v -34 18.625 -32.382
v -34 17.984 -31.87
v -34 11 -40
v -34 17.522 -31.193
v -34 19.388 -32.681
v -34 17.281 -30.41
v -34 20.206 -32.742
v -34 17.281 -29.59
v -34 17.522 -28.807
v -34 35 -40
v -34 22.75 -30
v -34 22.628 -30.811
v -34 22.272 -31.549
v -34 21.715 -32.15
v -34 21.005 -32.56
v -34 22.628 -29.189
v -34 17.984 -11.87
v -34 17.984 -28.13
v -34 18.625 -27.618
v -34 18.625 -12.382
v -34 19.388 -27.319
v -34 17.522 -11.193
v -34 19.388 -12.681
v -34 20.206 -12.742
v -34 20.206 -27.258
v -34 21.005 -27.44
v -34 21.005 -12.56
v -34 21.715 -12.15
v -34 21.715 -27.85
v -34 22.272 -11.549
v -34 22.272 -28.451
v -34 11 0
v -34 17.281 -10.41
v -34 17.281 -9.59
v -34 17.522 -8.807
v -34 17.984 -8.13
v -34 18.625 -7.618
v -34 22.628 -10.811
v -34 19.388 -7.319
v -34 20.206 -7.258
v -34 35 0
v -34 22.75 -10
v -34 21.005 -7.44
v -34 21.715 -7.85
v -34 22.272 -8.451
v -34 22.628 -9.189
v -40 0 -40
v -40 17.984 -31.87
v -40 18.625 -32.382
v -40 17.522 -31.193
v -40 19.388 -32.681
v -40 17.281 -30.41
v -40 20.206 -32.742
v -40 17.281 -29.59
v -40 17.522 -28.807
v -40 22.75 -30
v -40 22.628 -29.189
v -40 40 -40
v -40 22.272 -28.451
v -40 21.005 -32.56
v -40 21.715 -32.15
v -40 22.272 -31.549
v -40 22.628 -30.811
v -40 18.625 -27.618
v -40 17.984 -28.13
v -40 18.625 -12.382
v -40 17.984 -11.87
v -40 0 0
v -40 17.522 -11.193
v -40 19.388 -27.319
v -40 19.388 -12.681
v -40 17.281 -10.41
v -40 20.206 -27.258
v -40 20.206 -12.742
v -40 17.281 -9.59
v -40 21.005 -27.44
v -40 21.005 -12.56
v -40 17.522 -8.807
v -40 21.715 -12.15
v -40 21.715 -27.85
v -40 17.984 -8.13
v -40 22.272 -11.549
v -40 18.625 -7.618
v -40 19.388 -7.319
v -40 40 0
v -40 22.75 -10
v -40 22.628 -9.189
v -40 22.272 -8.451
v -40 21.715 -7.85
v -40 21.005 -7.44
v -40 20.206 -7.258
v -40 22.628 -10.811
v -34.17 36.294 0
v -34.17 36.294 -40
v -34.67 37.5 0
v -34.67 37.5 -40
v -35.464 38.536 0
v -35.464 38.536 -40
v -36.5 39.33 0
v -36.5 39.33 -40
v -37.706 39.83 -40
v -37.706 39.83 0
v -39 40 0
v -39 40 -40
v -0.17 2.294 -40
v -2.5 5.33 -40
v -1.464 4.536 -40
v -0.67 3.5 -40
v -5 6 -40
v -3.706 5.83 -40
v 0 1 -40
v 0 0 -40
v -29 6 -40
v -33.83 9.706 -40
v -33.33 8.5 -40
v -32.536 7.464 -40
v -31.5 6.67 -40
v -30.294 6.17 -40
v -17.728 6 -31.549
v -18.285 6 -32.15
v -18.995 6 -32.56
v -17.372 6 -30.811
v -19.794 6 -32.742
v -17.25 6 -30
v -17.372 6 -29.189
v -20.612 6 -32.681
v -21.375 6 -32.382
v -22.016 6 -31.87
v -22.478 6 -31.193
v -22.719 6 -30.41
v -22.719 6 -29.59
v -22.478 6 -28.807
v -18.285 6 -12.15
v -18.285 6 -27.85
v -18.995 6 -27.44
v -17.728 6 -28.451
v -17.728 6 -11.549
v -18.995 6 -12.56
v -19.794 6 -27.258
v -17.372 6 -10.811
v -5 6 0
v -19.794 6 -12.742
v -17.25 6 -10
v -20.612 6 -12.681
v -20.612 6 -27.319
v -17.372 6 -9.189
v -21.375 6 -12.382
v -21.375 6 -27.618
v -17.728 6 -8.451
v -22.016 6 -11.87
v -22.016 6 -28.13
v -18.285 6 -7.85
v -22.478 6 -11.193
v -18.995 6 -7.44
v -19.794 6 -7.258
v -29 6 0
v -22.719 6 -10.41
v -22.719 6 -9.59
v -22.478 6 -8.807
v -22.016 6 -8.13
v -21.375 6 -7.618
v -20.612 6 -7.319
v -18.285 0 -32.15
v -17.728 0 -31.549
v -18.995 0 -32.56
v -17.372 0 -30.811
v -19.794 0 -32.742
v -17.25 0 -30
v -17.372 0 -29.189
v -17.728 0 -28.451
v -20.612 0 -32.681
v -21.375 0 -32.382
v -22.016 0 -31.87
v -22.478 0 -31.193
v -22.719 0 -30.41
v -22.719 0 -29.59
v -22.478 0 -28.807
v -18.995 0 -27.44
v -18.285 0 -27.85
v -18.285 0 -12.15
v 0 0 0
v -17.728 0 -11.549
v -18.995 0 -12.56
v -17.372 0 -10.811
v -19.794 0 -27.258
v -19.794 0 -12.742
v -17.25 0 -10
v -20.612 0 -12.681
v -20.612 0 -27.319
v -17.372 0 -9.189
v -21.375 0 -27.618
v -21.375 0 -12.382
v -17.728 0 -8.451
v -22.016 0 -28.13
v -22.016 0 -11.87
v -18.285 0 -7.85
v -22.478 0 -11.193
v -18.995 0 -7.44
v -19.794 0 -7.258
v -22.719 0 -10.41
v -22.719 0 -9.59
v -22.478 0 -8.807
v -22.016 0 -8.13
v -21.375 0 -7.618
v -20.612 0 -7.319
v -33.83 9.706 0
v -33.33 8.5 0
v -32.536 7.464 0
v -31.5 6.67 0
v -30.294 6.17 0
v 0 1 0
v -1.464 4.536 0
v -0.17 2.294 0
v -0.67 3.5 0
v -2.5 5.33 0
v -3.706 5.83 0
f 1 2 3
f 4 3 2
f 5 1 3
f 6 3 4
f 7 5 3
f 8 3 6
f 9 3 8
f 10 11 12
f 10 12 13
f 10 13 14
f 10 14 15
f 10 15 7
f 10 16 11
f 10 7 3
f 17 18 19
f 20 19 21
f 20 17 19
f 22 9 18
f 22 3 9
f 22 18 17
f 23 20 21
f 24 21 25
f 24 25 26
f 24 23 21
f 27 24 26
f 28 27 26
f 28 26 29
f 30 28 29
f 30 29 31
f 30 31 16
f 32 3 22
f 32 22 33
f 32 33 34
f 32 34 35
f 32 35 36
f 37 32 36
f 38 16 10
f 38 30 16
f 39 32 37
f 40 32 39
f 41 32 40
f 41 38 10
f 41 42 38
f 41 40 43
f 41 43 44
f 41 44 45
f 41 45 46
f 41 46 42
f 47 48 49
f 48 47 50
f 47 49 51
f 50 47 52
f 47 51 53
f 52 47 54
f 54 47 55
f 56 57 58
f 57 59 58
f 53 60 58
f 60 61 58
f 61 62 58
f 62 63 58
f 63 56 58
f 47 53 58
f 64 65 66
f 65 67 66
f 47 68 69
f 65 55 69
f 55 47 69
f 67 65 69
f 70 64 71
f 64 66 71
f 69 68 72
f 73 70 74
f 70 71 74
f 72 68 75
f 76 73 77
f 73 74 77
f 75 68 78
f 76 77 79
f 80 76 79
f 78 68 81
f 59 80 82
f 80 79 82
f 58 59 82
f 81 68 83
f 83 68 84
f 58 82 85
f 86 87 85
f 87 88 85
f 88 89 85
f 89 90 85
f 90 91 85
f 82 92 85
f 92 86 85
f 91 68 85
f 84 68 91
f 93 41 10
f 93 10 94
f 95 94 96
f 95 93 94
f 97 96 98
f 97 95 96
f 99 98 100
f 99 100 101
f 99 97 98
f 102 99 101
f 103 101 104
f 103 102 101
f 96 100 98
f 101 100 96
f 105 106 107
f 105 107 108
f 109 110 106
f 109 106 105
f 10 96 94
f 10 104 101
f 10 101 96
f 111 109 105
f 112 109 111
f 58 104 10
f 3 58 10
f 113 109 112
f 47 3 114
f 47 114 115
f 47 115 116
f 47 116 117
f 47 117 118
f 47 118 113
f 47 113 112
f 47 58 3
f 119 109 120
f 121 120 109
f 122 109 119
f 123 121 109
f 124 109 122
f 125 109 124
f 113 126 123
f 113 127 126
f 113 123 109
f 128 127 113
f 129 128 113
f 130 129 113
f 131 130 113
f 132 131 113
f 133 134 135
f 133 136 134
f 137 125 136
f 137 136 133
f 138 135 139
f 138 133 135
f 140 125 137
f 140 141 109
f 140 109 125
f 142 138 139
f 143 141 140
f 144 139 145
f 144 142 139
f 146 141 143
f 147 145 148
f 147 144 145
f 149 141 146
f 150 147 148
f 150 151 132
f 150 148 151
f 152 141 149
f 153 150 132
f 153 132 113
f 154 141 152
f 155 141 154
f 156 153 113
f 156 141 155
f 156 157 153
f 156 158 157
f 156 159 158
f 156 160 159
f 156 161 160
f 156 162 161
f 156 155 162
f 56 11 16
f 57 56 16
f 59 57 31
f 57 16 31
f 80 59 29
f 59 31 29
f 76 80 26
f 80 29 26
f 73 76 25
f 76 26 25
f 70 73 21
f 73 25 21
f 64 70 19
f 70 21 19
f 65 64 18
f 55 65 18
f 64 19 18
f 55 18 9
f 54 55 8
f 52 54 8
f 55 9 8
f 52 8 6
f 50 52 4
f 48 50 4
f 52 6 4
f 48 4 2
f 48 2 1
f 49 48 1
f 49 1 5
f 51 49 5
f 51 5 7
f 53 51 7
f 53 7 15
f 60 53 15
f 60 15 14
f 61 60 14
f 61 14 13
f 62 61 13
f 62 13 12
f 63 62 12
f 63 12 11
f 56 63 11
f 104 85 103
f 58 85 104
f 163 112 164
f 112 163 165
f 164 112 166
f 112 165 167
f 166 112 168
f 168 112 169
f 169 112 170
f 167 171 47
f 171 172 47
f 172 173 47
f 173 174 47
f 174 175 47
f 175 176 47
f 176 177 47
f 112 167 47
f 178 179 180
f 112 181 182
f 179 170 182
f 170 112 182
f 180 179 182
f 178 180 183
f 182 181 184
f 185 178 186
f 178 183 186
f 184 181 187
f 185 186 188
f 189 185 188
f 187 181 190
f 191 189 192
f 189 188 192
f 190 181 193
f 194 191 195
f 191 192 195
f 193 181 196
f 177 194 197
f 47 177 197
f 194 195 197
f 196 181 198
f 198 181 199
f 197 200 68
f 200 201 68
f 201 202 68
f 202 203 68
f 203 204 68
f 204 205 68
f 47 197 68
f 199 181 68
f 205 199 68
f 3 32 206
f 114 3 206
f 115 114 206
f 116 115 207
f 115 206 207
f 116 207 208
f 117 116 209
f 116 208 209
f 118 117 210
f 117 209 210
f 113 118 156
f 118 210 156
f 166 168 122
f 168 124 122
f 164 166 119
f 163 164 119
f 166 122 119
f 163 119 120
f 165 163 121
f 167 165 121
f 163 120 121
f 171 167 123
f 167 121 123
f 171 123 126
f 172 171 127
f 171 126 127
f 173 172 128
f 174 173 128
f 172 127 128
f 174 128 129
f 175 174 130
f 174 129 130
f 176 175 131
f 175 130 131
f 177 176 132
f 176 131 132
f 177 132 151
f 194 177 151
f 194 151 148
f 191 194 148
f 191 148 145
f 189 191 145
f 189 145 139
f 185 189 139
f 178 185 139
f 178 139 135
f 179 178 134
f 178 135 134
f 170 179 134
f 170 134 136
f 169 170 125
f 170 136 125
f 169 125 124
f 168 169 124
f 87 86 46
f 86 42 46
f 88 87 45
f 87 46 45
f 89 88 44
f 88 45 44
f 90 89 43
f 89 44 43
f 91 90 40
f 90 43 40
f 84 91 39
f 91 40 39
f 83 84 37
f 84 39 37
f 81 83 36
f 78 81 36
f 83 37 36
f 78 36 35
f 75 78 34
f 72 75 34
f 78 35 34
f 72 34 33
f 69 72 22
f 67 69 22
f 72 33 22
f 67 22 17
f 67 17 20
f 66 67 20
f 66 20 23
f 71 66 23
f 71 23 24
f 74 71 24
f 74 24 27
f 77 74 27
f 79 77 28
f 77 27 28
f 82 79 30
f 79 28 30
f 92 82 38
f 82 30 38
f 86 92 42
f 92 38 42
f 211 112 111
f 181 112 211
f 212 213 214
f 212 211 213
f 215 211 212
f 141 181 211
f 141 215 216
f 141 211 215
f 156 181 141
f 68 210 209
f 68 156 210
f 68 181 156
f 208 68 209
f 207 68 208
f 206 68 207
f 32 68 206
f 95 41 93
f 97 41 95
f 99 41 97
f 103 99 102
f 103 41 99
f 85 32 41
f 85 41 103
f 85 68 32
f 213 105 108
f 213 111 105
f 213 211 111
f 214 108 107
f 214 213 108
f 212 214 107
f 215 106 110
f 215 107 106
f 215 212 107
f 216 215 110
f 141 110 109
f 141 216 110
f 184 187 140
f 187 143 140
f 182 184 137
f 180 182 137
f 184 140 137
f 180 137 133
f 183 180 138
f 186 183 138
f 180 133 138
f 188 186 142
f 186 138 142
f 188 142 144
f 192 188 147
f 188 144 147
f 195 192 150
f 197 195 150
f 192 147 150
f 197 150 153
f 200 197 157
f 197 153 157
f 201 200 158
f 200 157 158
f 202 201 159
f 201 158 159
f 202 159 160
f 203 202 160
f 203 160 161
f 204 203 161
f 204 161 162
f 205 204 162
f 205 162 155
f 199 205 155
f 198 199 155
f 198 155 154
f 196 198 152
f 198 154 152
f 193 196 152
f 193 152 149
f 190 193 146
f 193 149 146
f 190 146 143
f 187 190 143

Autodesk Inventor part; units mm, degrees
ref_plane "YZ Plane" through (0, 0, 0) normal (1, 0, 0) x (0, 1, 0)
ref_plane "XZ Plane" through (0, 0, 0) normal (0, 1, 0) x (-1, 0, 0)
sketch "Sketch1" plane through (0, 0, 0) normal (0, 1, 0) x (-1, 0, 0)
  line L0 (0, 0) -> (40, 0)
  line L1 (40, 0) -> (40, -40)
  line L2 (40, -40) -> (0, -40)
  line L3 (0, -40) -> (0, 0)
  dimension "d0" = 40
  dimension "d1" = 40
extrude "Extrusion1" add sketch "Sketch1" along normal blind 6
fillet "Fillet1" radius 5 1 edges at (-40, 0, -20)
fillet "Fillet2" radius 5 1 edges at (0, 6, -20)
sketch "Sketch2" plane through (0, 6, 0) normal (0, 1, 0) x (1, 0, 0)
  line L0 (-5, 40) -> (-5, 0) projected
  line L1 (-35, 40) -> (-35, 0) projected
  circle A0 centre (-20, 10) radius 2.75
  line L2 (-40, 0) -> (-5, 0) projected
  circle A1 centre (-20, 30) radius 2.75
  point P0 (0, 0)
  dimension "d6" = 5.5
  dimension "d7" = 30
  dimension "d8" = 40
  dimension "d9" = 10
  dimension "d10" = 15
  dimension "d22" = 20
ref_plane "Work Plane1" through (-40, 0, 0) normal (0.7071, -0.7071, 0) x (0, 0, 1)
mirror "Mirror1" about plane through (-40, 0, 0) normal (0.7071, -0.7071, 0) of "Extrusion1", "Fillet2"
fillet "Fillet3" radius 5 1 edges at (-34, 6, -20)
extrude "Extrusion4" cut sketch "Sketch2" against normal blind 10
mirror "Mirror2" about plane through (-40, 0, 0) normal (0.7071, -0.7071, 0) of "Extrusion4"
equation "\"d9\" = 0.25 * d8"
equation "\"d10\" = 0.5 * d7"
properties part number "L_Fixer2" material "Steel, Carbon"
